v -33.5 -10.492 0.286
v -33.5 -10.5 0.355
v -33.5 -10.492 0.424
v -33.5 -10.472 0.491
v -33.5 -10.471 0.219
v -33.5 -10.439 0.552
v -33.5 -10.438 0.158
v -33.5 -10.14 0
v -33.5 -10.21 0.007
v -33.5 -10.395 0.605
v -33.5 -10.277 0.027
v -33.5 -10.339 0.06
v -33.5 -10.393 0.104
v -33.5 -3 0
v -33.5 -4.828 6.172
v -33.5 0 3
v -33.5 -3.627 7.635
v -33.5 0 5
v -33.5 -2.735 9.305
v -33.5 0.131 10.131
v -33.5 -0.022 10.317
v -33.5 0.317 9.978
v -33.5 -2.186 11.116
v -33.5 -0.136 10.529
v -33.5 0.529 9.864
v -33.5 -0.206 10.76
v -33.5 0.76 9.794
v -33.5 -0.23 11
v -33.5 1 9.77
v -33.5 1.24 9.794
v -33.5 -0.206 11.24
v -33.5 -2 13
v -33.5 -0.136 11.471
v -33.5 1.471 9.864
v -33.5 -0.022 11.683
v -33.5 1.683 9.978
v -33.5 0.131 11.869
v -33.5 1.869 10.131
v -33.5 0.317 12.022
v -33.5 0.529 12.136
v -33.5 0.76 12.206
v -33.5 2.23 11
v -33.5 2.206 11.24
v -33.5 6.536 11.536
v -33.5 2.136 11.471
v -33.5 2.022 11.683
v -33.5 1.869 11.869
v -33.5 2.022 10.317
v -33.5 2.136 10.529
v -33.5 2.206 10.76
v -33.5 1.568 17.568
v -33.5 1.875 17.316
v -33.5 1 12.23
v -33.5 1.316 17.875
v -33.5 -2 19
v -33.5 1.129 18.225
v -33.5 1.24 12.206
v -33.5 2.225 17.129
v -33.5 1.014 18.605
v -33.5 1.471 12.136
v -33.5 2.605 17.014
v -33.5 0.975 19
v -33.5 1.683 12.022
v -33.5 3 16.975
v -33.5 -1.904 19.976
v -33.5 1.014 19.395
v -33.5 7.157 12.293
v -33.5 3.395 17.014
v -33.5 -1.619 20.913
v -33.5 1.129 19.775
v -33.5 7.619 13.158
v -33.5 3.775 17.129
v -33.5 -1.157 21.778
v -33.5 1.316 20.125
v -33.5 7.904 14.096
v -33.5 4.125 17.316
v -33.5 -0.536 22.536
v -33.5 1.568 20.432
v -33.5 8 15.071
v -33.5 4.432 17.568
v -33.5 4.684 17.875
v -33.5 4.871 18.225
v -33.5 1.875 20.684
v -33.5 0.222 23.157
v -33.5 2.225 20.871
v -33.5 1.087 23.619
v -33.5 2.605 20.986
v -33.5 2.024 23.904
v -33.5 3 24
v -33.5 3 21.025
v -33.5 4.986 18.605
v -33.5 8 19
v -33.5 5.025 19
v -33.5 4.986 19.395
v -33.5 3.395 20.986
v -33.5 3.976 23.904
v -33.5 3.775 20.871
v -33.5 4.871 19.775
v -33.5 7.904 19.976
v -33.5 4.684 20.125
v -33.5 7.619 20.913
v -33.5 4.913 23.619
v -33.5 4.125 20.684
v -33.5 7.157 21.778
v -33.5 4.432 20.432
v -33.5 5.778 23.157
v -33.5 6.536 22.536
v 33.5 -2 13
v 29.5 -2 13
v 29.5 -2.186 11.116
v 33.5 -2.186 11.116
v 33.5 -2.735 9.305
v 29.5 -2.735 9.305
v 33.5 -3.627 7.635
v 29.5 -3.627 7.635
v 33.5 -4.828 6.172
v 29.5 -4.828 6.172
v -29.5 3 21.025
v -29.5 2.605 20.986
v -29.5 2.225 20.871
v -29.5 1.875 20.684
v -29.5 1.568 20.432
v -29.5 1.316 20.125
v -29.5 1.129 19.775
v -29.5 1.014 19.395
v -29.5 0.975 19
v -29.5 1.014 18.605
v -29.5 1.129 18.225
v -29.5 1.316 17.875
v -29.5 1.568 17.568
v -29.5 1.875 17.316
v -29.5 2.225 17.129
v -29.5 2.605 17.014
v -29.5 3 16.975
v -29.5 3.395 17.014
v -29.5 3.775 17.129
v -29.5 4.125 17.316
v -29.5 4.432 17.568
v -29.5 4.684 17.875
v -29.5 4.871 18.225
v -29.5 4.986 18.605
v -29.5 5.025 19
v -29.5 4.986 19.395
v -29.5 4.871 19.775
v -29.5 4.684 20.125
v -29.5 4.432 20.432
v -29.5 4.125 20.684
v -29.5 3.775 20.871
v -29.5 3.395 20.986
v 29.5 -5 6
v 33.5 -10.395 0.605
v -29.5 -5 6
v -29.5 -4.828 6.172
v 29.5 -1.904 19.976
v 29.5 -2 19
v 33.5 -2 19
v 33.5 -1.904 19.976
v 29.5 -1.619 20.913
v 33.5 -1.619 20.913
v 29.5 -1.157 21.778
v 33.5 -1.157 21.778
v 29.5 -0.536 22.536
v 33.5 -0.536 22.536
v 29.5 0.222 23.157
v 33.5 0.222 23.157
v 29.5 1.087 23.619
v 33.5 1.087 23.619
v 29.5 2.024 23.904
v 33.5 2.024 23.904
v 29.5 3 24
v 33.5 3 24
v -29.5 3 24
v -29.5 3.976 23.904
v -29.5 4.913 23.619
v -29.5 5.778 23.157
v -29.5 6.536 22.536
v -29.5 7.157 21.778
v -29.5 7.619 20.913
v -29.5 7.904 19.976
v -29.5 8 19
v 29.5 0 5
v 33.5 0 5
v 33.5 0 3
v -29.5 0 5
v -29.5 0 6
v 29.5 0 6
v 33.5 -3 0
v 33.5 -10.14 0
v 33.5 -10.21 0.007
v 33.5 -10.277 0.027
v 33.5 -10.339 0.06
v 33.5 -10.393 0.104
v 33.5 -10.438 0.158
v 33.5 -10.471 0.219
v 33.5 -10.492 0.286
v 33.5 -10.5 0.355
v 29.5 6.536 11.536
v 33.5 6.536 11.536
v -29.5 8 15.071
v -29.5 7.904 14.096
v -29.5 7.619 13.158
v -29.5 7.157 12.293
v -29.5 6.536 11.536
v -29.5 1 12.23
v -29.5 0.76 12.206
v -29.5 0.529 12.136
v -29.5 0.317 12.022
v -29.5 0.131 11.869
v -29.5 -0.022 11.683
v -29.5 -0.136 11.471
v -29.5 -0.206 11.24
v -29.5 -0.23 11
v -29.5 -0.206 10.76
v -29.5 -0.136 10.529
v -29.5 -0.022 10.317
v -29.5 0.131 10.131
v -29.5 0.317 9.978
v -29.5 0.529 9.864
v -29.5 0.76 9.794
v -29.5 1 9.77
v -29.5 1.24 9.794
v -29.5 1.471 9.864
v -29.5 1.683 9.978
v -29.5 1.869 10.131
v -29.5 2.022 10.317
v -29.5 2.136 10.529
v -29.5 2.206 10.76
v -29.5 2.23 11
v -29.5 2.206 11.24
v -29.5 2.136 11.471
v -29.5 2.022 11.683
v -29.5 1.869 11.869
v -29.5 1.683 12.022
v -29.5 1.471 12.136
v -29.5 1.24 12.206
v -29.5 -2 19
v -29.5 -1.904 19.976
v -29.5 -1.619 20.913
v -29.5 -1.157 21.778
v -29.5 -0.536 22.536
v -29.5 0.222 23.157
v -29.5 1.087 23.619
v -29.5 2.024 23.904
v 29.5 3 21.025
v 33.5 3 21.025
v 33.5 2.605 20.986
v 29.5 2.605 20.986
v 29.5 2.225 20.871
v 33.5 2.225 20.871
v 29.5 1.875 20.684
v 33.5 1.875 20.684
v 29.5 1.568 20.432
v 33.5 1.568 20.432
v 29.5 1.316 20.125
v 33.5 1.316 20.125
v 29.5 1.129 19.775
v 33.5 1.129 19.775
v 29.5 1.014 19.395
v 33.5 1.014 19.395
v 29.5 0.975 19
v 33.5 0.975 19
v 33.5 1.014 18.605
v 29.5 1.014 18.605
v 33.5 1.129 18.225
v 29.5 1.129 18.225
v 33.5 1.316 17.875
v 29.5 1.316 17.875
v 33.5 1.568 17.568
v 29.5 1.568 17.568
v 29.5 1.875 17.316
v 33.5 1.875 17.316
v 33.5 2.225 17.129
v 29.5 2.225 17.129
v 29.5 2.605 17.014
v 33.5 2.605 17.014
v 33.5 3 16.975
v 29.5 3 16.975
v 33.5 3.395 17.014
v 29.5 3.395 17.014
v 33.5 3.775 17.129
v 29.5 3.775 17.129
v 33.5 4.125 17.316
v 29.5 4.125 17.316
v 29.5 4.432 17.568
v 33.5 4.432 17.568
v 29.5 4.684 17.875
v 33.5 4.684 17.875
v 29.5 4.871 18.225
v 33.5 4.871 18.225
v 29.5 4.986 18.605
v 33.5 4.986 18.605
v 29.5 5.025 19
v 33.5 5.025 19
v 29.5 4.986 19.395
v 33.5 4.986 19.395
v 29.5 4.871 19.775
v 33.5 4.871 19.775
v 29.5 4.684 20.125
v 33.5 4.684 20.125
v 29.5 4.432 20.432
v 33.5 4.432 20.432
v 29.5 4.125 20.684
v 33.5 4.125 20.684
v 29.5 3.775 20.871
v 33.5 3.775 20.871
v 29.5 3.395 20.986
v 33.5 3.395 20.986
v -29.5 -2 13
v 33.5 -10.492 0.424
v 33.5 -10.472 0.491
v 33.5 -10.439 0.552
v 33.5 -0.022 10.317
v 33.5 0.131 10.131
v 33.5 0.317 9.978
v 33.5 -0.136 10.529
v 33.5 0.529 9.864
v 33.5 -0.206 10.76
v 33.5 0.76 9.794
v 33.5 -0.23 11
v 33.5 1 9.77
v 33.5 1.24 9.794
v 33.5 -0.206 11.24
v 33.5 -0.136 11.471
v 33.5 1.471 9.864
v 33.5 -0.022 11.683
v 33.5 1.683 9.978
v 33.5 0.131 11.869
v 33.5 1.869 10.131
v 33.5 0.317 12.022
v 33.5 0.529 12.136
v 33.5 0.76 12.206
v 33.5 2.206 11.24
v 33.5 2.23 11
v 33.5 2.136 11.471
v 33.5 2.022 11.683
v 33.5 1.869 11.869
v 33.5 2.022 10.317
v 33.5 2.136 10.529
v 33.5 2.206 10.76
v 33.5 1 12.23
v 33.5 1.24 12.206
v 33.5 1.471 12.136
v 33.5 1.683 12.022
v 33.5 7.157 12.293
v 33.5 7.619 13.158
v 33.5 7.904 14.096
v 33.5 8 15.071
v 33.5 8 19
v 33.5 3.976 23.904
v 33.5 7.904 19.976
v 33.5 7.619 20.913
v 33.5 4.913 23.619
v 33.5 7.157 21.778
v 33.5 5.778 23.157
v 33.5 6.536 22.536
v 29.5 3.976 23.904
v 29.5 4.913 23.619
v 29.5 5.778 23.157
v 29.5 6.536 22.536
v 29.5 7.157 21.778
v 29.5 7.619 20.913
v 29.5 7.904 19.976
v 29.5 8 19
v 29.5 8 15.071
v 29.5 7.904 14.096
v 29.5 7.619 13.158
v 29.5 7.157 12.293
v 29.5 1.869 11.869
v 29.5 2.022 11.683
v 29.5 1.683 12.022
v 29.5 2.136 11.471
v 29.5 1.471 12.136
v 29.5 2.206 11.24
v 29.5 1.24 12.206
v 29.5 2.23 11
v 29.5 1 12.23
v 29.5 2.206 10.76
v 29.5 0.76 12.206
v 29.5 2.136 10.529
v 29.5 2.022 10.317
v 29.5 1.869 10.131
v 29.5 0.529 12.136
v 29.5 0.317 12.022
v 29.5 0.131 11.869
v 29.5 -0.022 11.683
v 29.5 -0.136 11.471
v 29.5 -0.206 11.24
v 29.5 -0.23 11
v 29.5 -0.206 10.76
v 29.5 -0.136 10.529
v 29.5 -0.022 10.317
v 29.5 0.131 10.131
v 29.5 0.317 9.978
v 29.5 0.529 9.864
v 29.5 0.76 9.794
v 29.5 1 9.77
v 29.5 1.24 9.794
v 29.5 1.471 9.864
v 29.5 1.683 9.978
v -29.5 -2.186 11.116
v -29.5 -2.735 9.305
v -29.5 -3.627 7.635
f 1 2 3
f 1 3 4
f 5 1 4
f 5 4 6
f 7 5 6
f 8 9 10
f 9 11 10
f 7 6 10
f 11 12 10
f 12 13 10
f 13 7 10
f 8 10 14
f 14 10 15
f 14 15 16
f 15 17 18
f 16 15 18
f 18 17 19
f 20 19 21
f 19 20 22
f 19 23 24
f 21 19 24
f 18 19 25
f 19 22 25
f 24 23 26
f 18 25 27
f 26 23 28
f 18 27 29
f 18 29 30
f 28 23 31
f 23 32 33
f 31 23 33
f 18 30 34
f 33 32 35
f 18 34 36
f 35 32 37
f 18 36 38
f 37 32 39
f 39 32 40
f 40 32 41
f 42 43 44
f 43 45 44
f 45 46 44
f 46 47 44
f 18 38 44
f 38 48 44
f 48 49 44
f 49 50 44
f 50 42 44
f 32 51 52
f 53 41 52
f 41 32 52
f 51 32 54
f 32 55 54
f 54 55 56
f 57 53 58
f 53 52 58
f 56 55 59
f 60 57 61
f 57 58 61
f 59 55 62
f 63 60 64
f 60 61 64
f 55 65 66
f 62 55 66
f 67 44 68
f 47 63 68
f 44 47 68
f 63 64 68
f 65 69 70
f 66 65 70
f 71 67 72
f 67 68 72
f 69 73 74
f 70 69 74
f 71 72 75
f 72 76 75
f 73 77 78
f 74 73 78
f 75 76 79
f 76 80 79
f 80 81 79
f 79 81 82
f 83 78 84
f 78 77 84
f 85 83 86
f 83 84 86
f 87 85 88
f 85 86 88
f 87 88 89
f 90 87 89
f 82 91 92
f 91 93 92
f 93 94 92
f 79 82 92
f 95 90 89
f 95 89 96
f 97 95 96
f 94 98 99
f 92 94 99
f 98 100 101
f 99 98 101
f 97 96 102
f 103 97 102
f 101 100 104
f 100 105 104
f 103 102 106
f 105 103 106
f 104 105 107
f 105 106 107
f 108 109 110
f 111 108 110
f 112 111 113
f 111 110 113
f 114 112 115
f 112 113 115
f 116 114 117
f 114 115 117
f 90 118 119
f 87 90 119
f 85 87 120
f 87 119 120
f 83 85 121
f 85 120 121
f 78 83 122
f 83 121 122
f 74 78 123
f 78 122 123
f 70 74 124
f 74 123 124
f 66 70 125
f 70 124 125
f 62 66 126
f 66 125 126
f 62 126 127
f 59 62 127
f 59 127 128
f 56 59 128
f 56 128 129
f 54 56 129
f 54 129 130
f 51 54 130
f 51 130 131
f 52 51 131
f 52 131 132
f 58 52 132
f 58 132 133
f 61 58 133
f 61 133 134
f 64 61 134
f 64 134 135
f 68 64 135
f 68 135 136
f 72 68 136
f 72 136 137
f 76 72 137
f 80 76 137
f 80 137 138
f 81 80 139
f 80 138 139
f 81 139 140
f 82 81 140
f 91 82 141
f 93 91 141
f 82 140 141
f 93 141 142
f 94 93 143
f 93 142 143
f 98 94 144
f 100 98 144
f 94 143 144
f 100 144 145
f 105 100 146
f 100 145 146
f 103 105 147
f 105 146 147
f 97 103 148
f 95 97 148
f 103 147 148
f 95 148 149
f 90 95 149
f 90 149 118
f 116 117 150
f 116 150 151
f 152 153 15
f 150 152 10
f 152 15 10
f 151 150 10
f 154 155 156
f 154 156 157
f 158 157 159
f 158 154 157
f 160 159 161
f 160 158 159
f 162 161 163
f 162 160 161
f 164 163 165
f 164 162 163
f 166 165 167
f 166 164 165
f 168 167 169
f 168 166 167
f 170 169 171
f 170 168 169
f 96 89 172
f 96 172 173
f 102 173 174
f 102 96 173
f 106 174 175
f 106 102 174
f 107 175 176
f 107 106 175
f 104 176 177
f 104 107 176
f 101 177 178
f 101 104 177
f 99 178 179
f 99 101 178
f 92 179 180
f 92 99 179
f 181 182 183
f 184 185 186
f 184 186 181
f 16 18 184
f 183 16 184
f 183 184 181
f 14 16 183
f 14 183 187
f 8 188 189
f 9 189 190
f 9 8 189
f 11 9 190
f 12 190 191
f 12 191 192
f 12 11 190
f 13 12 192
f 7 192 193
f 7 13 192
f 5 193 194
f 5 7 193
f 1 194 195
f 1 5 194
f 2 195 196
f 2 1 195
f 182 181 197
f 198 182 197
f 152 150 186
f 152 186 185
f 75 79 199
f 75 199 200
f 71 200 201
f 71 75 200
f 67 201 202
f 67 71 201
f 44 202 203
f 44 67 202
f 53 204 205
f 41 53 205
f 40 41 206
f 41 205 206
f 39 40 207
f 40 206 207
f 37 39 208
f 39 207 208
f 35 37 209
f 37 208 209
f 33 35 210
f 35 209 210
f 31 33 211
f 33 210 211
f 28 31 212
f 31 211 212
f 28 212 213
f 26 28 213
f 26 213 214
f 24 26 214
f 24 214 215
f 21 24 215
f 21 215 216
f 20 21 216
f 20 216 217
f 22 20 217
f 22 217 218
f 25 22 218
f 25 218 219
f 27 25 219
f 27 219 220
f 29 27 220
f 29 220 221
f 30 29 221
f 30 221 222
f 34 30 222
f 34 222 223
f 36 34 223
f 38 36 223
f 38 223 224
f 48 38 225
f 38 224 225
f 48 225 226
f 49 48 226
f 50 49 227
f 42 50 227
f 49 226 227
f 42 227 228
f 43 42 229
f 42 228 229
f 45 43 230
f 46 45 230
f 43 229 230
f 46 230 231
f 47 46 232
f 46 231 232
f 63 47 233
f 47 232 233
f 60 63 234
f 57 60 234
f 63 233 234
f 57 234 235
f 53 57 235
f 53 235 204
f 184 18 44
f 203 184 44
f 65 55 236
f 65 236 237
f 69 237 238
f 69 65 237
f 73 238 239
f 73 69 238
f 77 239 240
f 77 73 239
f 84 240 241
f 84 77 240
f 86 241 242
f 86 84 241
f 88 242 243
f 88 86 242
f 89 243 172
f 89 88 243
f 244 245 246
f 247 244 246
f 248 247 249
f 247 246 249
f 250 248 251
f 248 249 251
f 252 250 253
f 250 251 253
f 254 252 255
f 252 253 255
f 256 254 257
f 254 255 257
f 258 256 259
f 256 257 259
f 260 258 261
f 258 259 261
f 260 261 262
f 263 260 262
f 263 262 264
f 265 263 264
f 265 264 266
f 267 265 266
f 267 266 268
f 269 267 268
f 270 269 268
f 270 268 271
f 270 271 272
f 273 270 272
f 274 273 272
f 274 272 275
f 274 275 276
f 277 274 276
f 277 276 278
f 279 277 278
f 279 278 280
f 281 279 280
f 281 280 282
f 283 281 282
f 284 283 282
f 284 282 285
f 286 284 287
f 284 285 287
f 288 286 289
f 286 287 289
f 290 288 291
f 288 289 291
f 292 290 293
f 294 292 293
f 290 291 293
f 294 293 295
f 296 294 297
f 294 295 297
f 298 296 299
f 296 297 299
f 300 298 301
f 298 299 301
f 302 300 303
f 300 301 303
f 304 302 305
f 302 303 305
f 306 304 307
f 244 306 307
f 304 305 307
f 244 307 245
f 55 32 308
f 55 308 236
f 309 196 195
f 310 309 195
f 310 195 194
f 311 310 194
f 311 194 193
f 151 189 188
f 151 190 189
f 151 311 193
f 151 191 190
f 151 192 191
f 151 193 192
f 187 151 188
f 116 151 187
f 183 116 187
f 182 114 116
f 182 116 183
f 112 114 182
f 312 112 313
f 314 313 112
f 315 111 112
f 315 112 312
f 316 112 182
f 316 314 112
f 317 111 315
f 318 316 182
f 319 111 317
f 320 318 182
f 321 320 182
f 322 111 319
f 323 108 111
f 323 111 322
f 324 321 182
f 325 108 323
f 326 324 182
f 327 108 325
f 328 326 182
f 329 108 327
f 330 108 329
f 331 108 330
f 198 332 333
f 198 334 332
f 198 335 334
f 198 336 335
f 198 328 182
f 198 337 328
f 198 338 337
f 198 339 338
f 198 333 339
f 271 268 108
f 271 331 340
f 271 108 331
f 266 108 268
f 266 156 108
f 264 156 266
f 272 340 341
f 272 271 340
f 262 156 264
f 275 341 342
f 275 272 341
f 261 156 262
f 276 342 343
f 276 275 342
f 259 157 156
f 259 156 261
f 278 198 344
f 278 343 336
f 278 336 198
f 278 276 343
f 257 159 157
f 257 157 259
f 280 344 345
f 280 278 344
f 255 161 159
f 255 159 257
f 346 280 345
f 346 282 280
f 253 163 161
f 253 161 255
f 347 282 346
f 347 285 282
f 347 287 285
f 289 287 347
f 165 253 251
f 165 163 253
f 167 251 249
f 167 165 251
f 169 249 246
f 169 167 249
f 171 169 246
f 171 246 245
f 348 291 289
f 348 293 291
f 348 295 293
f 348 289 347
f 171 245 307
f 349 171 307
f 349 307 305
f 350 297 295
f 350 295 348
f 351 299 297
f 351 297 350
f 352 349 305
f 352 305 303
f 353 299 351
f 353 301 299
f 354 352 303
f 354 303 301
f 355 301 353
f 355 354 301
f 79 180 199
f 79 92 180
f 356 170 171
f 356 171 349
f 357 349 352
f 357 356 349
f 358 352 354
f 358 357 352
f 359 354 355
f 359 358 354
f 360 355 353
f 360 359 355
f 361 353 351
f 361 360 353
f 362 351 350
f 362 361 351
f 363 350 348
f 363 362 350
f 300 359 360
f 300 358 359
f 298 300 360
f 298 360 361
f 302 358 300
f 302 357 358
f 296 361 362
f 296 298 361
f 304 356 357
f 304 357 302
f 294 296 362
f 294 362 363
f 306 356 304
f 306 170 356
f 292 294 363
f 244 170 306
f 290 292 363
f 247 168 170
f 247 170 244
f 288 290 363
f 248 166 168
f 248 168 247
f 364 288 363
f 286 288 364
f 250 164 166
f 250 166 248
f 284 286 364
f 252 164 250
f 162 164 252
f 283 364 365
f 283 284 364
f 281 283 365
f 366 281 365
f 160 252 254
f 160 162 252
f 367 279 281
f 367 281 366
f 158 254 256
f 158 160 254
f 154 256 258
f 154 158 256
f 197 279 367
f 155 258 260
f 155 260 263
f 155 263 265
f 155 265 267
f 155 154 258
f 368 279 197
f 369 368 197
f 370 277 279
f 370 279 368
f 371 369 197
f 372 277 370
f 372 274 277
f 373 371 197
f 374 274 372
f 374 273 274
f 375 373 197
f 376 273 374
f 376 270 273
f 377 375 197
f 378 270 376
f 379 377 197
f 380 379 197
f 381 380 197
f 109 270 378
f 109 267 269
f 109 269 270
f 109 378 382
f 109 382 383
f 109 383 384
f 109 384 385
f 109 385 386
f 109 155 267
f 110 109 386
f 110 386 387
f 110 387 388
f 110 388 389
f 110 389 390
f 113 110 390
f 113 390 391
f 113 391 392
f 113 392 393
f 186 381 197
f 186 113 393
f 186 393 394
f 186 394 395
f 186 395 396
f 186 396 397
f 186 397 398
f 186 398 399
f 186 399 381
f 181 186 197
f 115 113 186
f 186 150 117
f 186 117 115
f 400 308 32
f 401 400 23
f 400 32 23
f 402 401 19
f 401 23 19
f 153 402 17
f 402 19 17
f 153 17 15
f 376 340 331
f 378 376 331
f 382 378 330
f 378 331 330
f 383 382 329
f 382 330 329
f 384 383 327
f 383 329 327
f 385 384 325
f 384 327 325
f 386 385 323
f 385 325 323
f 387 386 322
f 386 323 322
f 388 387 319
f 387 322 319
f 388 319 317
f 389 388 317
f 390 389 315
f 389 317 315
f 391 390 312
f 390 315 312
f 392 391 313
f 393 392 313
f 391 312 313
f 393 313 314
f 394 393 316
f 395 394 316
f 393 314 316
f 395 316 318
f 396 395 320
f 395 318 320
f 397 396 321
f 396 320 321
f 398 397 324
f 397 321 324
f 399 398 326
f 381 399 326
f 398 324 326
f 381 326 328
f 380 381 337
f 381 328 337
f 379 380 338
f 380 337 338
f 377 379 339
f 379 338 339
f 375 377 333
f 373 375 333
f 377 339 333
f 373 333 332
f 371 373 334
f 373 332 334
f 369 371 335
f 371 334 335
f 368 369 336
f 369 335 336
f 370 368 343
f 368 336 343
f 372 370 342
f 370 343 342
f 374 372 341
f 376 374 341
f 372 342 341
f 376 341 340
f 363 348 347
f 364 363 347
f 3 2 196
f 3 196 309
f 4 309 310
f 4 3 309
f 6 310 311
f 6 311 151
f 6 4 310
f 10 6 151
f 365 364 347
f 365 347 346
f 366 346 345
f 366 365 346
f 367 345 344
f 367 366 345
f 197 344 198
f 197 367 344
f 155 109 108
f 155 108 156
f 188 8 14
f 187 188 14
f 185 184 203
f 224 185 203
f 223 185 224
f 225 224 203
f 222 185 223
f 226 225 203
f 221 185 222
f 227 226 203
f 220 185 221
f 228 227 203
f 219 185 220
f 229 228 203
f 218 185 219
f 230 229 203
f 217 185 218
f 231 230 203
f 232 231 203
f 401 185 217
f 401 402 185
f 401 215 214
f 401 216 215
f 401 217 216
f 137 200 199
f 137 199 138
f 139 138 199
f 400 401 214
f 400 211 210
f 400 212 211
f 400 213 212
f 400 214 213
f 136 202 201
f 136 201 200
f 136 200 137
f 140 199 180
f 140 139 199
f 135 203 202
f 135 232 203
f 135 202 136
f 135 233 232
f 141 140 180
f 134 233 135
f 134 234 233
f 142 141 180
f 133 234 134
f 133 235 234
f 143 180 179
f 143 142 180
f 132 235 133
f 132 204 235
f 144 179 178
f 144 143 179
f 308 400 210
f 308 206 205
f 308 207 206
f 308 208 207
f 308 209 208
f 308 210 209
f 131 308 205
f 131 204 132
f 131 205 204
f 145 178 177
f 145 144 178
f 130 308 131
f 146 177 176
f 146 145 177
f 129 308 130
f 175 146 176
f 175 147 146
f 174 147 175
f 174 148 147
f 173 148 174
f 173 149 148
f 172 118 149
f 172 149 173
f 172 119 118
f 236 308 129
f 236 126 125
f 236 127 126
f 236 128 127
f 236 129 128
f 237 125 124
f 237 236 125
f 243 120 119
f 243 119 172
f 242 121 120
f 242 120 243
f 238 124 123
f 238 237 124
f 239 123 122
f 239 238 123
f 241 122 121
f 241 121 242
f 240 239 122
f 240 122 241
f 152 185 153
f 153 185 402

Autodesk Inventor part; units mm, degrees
ref_plane "YZ Plane" through (0, 0, 0) normal (1, 0, 0) x (0, 1, 0)
ref_plane "XZ Plane" through (0, 0, 0) normal (0, 1, 0) x (-1, 0, 0)
ref_plane "XY Plane" through (0, 0, 0) normal (0, 0, 1) x (1, 0, 0)
sketch "Skizze1" plane through (0, 0, 0) normal (1, 0, 0) x (0, 1, 0)
  line L0 (-4.8284, 6.1716) -> (-10.5, 0.5)
  line L1 (-10.5, 0) -> (-3, 0)
  line L2 (-10.5, 0.5) -> (-10.5, 0)
  line L3 (0, 5) -> (8, 13)
  circle A0 centre (3, 19) radius 0.5
  line L4 (-2, 13) -> (-2, 24)
  line L5 (-2, 24) -> (8, 24)
  line L6 (8, 24) -> (8, 13)
  line L7 (0, 3) -> (-3, 0)
  line L8 (8, 13) -> (-2, 13) construction
  arc A1 (-4.8284, 6.1716) -> (-2, 13) centre (-11.6569, 13) ccw
  line L9 (0, 5) -> (0, 3)
  line L10 (3, 19) -> (3, 0) construction
  point P0 (0, 0)
  dimension "d40" = 0.5
  dimension "d44" = 1
  dimension "d59" = 10
  dimension "d60" = 45
  dimension "d61" = 5
  dimension "d63" = 45
  dimension "d78" = 3
  dimension "d79" = 10.5
  dimension "d80" = 0
  dimension "d81" = 19
  dimension "d82" = 5
  dimension "d83" = 3
extrude "Extrusion1" add sketch "Skizze1" along normal mid plane 67
sketch "Skizze6" plane through (0, 0, 0) normal (0, 1, 0) x (-1, 0, 0)
  line L0 (33.5, 0.5) -> (-33.5, 0.5) projected
  line L1 (-33.5, 6.1716) -> (-33.5, 0.5) projected
  line L2 (33.5, 0.5) -> (33.5, 6.1716) projected
  line L3 (-29.5, 6) -> (29.5, 6)
  line L4 (29.5, 6) -> (29.5, 36)
  line L5 (29.5, 36) -> (-29.5, 36)
  line L6 (-29.5, 36) -> (-29.5, 6)
  line L7 (0, -7.2) -> (0, 43.2) projected
  line L8 (33.5, 0) -> (-33.5, 0) projected
  line L9 (-33.5, 0) -> (33.5, 0) projected
  point P0 (0, 0)
  point P1 (-33, 10)
  point P2 (33, 10)
  dimension "d45" = 4
  dimension "d46" = 30
  dimension "d50" = 6
extrude "Extrusion4" cut sketch "Skizze6" along normal through all both and the other way through all
sketch "Skizze3" plane through (-33.5, 0, 0) normal (-1, 0, 0) x (0, 0, 1)
  line L0 (0, -3) -> (0, -10.5) projected
  line L1 (0.5, -10.5) -> (6.1716, -4.8284) projected
  line L2 (0, -10.5) -> (0, 0) construction
  line L3 (0, 11.9314) -> (0, -15.5882) projected
  line L4 (0, -10.5) -> (0.5, -10.5) projected
  line L5 (13, 8) -> (5, 0) projected
  line L6 (13, -2) -> (24, -2) projected
  line L7 (24, -2) -> (24, 8) projected
  line L8 (24, 8) -> (13, 8) projected
  circle A0 centre (19, 3) radius 0.5 projected
  line L9 (3, 0) -> (0, -3) projected
  arc A1 (13, -2) -> (6.1716, -4.8284) centre (13, -11.6569) ccw projected
  line L10 (5, 0) -> (3, 0) projected
hole "Bohrung1" at (-33.5, 3, 19) direction (1, 0, 0) diameter 4.05 end through all
sketch "Skizze4" plane through (-33.5, 0, 0) normal (-1, 0, 0) x (0, 0, 1)
  line L0 (0, 11.7) -> (0, -14.2) projected
  line L1 (-5.8, 0) -> (34.8, 0) projected
  point P0 (29, 0)
  point P1 (11, 1)
  dimension "d38" = 11
  dimension "d84" = 1
hole "Bohrung2" at (-33.5, 1, 11) direction (1, 0, 0) diameter 2.459 end through all thread size "M3x0.5" class "6H" standard "ISO Metric profile"
fillet "Rundung2" radius 5 6 edges at (31.5, -2, 24) (31.5, 8, 24) (-31.5, 8, 24) (-31.5, -2, 24) (31.5, 8, 13) (-31.5, 8, 13)
fillet "Rundung7" [suppressed]
fillet "Rundung8" radius 0.36 2 edges at (0, -10.5, 0.5) (0, -10.5, 0)
sketch "Skizze7" plane through (-29.5, 1, 6) normal (0, 0, 1) x (1, 0, 0)
  line L0 (0, 0) -> (59, 0) projected
  line L1 (0, 0) -> (0, -6) projected
  line L2 (59, -6) -> (0, -6) projected
  line L3 (59, -6) -> (59, 0) projected
  line L4 (-17.4, -1) -> (76.4, -1) projected
  point P0 (29.5, -1)
  point P1 (0, -1)
  point P2 (59, -1)
extrude "Extrusion5" cut sketch "Skizze7" against normal through all contours L0 L3 L4 L1
properties part number "Chip Schaufel v2" material "Aluminium 6061"
